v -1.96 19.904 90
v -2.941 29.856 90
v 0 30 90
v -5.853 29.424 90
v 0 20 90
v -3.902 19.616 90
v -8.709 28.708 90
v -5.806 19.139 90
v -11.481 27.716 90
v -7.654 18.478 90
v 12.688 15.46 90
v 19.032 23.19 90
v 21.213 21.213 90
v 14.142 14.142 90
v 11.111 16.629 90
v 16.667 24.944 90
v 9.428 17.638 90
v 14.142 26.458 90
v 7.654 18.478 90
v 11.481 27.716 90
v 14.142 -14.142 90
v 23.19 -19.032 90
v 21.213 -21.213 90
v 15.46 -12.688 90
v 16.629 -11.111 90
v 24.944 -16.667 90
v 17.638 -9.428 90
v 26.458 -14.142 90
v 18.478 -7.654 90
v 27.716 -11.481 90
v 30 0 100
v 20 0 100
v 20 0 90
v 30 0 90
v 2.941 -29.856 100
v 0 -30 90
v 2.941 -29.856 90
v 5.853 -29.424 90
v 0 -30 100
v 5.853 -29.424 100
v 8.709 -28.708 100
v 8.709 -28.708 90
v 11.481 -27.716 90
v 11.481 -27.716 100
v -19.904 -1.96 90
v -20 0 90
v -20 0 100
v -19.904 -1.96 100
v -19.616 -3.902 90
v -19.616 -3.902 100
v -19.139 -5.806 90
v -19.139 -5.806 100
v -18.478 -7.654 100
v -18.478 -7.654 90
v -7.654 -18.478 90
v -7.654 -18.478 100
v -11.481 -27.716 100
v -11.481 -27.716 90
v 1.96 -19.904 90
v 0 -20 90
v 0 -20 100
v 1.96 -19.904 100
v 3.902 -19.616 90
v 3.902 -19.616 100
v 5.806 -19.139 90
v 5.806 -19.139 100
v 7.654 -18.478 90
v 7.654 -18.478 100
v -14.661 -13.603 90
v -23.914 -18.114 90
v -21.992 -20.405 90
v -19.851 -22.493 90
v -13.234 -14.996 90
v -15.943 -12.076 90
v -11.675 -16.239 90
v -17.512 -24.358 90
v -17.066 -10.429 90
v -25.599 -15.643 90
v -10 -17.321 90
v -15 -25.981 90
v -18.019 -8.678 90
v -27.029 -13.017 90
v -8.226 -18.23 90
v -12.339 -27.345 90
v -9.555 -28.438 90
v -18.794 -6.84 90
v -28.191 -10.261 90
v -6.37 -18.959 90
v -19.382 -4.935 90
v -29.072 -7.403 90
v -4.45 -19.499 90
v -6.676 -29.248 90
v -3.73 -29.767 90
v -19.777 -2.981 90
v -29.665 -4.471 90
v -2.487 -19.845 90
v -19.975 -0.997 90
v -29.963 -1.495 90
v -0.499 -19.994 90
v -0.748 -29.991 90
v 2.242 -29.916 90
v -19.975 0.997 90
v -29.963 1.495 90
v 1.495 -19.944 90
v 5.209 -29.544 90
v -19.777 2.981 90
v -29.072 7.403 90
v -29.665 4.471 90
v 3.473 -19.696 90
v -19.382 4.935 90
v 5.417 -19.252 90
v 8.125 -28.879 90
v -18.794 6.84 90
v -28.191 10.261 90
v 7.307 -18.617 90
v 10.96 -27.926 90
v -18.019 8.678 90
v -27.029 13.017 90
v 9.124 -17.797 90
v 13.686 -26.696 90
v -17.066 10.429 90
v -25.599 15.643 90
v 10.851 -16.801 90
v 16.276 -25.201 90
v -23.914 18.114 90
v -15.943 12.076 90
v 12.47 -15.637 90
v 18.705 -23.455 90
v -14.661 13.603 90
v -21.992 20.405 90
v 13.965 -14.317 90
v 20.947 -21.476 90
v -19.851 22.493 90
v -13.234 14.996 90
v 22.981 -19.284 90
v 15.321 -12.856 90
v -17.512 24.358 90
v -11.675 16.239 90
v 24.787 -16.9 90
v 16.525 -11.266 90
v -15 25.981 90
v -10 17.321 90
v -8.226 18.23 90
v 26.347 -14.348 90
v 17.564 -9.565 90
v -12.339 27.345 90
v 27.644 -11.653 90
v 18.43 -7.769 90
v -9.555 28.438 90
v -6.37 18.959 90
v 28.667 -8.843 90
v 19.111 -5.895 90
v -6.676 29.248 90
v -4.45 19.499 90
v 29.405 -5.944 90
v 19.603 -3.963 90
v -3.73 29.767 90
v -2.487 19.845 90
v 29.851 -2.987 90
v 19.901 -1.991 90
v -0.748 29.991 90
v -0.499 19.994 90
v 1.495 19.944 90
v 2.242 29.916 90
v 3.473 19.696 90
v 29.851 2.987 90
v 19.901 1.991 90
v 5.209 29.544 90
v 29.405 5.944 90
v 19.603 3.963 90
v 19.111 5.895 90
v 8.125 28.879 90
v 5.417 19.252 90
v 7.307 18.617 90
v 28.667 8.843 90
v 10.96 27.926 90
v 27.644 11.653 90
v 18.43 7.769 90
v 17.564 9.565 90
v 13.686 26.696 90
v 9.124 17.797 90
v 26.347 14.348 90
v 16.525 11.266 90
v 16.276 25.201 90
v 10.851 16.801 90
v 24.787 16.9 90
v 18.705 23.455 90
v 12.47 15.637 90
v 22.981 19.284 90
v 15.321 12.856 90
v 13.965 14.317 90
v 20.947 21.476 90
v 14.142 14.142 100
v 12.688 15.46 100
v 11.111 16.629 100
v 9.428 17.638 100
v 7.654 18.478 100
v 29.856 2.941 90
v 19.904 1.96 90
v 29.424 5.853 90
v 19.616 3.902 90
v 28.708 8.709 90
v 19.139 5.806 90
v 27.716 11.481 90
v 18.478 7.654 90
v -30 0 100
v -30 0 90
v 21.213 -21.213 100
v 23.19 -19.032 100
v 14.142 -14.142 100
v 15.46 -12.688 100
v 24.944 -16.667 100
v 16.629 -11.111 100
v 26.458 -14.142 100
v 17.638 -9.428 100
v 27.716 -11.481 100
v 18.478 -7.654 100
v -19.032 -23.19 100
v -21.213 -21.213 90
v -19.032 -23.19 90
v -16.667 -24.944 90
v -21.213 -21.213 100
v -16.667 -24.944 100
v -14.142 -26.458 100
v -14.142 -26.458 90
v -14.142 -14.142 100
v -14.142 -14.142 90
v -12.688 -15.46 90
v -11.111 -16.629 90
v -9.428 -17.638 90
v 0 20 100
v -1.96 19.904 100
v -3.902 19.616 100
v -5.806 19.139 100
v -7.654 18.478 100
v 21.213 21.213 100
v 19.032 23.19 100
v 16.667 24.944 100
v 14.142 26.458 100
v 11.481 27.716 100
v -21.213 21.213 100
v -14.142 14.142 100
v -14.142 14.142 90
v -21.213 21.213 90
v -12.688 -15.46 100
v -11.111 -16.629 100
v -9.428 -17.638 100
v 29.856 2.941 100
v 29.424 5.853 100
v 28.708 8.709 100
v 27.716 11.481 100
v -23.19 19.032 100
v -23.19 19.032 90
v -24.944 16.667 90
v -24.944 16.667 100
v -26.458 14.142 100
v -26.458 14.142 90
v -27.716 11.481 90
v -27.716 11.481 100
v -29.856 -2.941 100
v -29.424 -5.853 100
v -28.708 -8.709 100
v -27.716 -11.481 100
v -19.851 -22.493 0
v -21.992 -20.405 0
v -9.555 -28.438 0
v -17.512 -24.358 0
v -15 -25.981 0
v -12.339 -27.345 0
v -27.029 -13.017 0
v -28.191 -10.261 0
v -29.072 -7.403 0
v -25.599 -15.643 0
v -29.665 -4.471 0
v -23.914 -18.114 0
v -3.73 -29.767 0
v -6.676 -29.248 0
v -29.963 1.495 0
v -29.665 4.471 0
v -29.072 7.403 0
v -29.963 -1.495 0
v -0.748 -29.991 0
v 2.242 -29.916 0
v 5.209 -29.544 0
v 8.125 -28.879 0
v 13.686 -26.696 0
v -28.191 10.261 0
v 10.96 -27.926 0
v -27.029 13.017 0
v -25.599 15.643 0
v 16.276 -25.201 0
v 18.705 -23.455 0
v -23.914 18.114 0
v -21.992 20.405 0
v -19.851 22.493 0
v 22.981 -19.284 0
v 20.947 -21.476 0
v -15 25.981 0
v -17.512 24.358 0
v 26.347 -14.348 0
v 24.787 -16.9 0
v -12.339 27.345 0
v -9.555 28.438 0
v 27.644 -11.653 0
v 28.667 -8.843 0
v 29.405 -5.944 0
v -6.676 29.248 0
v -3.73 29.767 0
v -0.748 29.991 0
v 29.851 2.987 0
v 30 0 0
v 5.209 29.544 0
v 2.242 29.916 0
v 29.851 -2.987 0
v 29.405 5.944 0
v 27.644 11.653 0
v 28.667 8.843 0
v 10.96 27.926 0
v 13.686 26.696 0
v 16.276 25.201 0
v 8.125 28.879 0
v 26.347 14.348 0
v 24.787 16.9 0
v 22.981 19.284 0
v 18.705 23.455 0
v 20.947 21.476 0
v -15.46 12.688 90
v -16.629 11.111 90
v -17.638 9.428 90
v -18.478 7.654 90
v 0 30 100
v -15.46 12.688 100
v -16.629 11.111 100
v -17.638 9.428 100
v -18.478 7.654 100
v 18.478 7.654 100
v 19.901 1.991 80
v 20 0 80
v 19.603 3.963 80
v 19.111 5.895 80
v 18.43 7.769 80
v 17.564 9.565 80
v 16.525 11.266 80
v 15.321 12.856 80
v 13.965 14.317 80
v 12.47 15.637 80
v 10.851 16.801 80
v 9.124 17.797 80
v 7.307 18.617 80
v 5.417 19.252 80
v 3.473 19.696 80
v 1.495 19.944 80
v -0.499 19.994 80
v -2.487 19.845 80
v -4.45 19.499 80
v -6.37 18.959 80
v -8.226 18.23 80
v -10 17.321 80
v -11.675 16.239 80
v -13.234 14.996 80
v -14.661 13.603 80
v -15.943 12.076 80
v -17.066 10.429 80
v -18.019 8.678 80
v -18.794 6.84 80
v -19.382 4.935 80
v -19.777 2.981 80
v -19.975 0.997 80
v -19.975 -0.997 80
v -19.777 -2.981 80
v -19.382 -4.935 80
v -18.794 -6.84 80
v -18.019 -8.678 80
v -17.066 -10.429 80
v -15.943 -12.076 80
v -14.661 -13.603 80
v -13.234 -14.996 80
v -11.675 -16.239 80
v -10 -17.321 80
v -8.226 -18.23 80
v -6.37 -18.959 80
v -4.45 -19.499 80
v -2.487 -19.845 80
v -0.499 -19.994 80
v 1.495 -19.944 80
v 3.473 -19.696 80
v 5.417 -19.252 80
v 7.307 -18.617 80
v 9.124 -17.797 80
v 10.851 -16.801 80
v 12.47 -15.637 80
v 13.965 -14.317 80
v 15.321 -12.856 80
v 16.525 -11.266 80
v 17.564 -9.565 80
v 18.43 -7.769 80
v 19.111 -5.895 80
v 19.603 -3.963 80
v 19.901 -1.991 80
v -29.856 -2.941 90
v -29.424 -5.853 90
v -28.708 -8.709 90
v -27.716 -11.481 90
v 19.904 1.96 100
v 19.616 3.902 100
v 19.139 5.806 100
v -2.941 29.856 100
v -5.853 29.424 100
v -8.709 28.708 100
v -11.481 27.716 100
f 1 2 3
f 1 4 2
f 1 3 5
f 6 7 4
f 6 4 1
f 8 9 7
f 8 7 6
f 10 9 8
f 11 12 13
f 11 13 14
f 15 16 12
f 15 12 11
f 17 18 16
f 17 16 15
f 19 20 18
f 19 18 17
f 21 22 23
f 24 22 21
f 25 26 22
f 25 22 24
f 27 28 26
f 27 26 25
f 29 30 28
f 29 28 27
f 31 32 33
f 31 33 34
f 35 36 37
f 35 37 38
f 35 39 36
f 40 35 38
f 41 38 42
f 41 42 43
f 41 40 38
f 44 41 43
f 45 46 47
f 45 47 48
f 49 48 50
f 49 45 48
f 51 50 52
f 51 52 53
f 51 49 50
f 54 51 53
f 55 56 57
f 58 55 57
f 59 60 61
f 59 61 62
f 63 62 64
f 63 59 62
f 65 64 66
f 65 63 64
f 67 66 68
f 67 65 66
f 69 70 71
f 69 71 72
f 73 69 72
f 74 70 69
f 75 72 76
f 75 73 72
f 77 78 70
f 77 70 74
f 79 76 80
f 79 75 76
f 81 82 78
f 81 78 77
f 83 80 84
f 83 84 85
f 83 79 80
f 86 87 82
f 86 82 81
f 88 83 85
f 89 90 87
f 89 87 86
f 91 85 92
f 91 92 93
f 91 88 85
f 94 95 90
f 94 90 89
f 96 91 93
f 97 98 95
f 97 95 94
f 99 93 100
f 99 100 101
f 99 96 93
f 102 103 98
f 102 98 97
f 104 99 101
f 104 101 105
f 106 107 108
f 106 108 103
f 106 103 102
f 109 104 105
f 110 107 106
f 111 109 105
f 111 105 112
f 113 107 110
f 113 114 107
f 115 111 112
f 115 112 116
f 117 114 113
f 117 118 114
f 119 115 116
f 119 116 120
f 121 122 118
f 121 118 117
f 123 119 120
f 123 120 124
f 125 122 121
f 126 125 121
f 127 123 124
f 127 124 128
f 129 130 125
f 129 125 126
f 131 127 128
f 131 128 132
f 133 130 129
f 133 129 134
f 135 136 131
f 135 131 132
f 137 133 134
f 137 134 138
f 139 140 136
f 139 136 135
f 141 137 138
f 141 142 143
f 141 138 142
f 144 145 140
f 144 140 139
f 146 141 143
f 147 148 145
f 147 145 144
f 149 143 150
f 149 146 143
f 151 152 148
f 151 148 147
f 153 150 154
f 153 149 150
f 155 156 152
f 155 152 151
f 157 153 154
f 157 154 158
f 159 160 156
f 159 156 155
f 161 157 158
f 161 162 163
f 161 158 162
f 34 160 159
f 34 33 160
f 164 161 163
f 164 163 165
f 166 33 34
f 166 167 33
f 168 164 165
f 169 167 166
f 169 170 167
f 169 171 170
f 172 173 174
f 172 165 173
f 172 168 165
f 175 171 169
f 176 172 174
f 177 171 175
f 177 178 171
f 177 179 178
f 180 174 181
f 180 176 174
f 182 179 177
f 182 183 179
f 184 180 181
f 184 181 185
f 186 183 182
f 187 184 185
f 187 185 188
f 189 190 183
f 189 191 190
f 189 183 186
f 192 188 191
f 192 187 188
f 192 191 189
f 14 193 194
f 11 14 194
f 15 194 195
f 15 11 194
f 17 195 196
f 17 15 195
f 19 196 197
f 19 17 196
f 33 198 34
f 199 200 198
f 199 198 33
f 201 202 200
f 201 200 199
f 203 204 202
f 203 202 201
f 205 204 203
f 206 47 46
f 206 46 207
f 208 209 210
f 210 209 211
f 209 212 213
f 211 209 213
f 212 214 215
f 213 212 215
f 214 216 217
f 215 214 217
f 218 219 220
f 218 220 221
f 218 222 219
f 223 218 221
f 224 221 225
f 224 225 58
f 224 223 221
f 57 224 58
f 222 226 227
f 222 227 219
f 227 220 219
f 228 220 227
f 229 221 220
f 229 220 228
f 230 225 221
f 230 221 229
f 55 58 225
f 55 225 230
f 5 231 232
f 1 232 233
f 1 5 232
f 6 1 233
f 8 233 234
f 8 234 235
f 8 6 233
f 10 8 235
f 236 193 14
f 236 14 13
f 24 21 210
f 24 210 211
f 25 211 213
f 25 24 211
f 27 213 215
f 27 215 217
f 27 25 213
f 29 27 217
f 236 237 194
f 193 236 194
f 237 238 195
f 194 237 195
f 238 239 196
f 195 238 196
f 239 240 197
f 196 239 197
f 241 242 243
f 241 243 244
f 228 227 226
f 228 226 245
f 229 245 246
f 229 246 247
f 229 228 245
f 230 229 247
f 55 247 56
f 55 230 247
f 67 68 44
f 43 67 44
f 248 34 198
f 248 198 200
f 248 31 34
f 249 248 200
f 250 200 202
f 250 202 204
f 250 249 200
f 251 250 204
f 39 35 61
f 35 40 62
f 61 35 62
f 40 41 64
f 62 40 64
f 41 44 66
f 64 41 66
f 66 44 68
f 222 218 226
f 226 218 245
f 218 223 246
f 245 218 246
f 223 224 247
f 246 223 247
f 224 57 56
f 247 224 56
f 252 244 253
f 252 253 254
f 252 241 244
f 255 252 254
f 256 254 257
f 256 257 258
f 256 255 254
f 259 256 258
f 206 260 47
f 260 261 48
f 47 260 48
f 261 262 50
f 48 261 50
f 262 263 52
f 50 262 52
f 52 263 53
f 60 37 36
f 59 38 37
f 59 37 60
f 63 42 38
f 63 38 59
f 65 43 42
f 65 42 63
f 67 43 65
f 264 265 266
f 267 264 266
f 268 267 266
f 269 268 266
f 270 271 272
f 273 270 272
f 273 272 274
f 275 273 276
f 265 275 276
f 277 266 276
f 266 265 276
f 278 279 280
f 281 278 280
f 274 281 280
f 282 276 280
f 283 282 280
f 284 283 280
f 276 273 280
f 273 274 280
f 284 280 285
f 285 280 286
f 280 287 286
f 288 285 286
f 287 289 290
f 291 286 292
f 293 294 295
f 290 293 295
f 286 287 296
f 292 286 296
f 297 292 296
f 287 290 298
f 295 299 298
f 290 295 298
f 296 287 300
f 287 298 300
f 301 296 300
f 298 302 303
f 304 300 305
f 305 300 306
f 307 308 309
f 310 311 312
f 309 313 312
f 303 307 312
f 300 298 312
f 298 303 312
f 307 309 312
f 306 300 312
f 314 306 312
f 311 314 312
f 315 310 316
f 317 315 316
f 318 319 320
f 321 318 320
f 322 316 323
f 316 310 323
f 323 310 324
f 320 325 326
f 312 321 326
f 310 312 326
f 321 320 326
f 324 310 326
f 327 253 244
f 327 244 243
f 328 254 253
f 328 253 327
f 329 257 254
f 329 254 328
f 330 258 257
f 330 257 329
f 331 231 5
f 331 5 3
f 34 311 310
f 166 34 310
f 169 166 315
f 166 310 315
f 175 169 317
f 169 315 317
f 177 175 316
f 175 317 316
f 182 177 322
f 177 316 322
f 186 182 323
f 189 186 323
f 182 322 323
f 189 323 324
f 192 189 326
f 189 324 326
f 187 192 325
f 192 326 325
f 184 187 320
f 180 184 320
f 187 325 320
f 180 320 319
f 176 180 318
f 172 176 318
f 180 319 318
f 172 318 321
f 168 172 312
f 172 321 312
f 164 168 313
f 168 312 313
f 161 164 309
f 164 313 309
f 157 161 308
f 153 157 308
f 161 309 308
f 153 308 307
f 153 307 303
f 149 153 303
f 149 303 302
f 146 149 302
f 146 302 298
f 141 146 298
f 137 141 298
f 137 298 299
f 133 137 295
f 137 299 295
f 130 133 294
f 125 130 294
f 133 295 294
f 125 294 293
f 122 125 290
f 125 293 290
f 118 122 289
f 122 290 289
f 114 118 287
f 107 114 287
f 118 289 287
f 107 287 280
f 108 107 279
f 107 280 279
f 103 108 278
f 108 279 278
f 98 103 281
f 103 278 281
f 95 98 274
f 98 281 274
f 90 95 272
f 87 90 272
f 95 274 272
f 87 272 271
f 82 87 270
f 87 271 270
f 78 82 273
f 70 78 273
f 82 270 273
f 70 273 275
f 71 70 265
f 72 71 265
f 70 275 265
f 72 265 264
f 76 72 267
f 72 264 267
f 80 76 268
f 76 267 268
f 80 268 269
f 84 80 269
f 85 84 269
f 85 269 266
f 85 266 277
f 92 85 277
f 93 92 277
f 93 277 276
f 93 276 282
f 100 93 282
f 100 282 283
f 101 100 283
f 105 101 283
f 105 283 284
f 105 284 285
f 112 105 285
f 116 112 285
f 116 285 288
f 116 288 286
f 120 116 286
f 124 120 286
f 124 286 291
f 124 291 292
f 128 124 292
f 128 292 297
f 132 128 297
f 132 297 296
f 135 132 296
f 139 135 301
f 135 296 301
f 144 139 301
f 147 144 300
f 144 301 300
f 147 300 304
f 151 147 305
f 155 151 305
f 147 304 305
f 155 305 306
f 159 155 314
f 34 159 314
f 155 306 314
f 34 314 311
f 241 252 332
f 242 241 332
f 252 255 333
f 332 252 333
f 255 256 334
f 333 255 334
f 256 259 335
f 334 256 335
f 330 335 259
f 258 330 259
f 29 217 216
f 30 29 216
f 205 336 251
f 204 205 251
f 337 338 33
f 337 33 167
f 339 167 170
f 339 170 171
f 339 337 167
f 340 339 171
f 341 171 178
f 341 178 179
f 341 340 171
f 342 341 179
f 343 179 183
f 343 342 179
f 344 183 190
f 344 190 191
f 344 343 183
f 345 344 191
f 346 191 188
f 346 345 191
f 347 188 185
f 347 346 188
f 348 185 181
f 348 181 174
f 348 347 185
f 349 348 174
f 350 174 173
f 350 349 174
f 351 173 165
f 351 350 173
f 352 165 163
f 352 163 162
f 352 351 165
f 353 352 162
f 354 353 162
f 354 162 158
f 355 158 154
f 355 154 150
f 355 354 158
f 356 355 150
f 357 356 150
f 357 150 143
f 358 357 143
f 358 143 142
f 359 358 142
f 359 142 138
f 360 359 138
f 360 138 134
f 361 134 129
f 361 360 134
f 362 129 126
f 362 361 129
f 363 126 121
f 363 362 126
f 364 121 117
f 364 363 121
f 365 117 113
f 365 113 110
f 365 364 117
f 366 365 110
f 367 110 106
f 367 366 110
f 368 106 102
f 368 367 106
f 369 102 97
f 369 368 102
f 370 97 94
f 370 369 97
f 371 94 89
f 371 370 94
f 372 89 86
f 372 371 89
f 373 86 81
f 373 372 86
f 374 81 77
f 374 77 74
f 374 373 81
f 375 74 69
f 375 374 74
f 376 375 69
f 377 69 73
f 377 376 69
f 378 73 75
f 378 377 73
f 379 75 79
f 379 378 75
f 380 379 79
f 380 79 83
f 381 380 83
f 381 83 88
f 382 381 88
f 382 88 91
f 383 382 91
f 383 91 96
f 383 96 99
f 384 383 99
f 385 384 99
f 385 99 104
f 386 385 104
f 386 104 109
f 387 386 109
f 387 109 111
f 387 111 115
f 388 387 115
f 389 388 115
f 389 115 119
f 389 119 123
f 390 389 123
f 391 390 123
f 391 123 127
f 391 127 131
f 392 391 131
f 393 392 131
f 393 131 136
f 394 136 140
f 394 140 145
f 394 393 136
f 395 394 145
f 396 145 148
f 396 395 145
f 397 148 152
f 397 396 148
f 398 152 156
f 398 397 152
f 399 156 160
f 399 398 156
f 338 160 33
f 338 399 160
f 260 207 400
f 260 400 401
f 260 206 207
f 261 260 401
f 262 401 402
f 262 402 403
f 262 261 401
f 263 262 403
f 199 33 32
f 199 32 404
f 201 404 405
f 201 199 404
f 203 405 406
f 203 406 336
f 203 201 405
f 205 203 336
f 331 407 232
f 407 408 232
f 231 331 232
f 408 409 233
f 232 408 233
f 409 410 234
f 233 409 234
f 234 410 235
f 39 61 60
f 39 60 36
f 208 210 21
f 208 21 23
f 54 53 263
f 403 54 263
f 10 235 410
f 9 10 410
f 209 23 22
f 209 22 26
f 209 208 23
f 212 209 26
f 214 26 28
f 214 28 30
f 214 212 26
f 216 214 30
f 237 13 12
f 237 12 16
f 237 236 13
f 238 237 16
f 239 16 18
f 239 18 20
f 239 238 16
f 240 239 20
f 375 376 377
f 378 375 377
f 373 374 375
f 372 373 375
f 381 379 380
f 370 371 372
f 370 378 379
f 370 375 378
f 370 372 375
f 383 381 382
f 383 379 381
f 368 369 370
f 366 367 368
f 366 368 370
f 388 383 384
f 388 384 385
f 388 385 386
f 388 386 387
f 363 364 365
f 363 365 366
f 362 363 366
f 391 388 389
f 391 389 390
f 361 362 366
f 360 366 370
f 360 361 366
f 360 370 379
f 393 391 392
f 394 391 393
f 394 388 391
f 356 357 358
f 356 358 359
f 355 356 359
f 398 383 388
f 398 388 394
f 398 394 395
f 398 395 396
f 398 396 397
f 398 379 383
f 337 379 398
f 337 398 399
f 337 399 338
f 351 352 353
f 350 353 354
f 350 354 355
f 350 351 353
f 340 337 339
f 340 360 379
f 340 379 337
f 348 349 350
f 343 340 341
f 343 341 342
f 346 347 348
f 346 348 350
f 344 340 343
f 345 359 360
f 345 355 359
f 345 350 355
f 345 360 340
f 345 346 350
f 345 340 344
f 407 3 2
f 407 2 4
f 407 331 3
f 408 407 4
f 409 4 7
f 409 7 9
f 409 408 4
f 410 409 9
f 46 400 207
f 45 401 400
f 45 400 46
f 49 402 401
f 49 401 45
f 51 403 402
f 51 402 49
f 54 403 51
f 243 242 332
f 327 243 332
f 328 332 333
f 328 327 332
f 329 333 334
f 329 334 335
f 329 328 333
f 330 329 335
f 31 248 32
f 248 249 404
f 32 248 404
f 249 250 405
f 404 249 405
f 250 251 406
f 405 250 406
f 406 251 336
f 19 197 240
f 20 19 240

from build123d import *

# Parameters (mm, degrees)
CYLINDER001_R               = 20
CYLINDER001_DEPTH           = 10
CYLINDER_R                  = 30
CYLINDER_DEPTH              = 90
CYLINDER010_R               = 20
CYLINDER010_DEPTH           = 10
CYLINDER009_W               = 30
CYLINDER009_H               = 10
CYLINDER009_ANGLE           = 22.5
CYLINDER009_PLACEMENT_ANGLE = 315
CYLINDER008_W               = 30
CYLINDER008_H               = 10
CYLINDER008_ANGLE           = 22.5
CYLINDER007_W               = 30
CYLINDER007_H               = 10
CYLINDER007_ANGLE           = 22.5
CYLINDER007_PLACEMENT_ANGLE = 225
CYLINDER006_W               = 30
CYLINDER006_H               = 10
CYLINDER006_ANGLE           = 22.5
CYLINDER005_W               = 30
CYLINDER005_H               = 10
CYLINDER005_ANGLE           = 22.5
CYLINDER005_PLACEMENT_ANGLE = 135
CYLINDER004_W               = 30
CYLINDER004_H               = 10
CYLINDER004_ANGLE           = 22.5
CYLINDER003_W               = 30
CYLINDER003_H               = 10
CYLINDER003_ANGLE           = 22.5
CYLINDER003_PLACEMENT_ANGLE = 45
CYLINDER002_W               = 30
CYLINDER002_H               = 10
CYLINDER002_ANGLE           = 22.5


with BuildPart() as cylinder001:
    # Cylinder001 → Cylinder001 (new body)
    with BuildSketch(Plane.XY.offset(80)):
        Circle(CYLINDER001_R)
    extrude(amount=CYLINDER001_DEPTH)


with BuildPart() as cut:
    # Cylinder → Cylinder (new body)
    with BuildSketch(Plane.XY):
        Circle(CYLINDER_R)
    extrude(amount=CYLINDER_DEPTH)

    # Cut: cut Cylinder001
    add(cylinder001.part, mode=Mode.SUBTRACT)


with BuildPart() as cylinder010:
    # Cylinder010 → Cylinder010 (new body)
    with BuildSketch(Plane.XY.offset(90)):
        Circle(CYLINDER010_R)
    extrude(amount=CYLINDER010_DEPTH)


with BuildPart() as cut001:
    # Cylinder009 → Cylinder009 (revolve)
    with BuildSketch(Plane.XZ):
        with Locations((15, 5)):
            Rectangle(CYLINDER009_W, CYLINDER009_H)
    revolve(axis=Axis((0, 0, 0), (0, 0, 1)), revolution_arc=CYLINDER009_ANGLE)


with BuildPart() as cut001_1:
    # Cylinder009 placement: moved
    add(cut001.part.moved(Location((0, 0, 90))).rotate(Axis((0, 0, 90), (0, 0, 1)), CYLINDER009_PLACEMENT_ANGLE))

    # Cut001: cut Cylinder010
    add(cylinder010.part, mode=Mode.SUBTRACT)


with BuildPart() as cut002:
    # Cylinder008 → Cylinder008 (revolve)
    with BuildSketch(Plane(origin=(0, 0, 90), x_dir=(0, -1, 0), z_dir=(-1, 0, 0))):
        with Locations((15, 5)):
            Rectangle(CYLINDER008_W, CYLINDER008_H)
    revolve(axis=Axis((0, 0, 90), (0, 0, 1)), revolution_arc=CYLINDER008_ANGLE)

    # Cut002: cut Cylinder010
    add(cylinder010.part, mode=Mode.SUBTRACT)


with BuildPart() as cut003:
    # Cylinder007 → Cylinder007 (revolve)
    with BuildSketch(Plane.XZ):
        with Locations((15, 5)):
            Rectangle(CYLINDER007_W, CYLINDER007_H)
    revolve(axis=Axis((0, 0, 0), (0, 0, 1)), revolution_arc=CYLINDER007_ANGLE)


with BuildPart() as cut003_1:
    # Cylinder007 placement: moved
    add(cut003.part.moved(Location((0, 0, 90))).rotate(Axis((0, 0, 90), (0, 0, 1)), CYLINDER007_PLACEMENT_ANGLE))

    # Cut003: cut Cylinder010
    add(cylinder010.part, mode=Mode.SUBTRACT)


with BuildPart() as cut004:
    # Cylinder006 → Cylinder006 (revolve)
    with BuildSketch(Plane(origin=(0, 0, 90), x_dir=(-1, 0, 0), z_dir=(0, 1, 0))):
        with Locations((15, 5)):
            Rectangle(CYLINDER006_W, CYLINDER006_H)
    revolve(axis=Axis((0, 0, 90), (0, 0, 1)), revolution_arc=CYLINDER006_ANGLE)

    # Cut004: cut Cylinder010
    add(cylinder010.part, mode=Mode.SUBTRACT)


with BuildPart() as cut005:
    # Cylinder005 → Cylinder005 (revolve)
    with BuildSketch(Plane.XZ):
        with Locations((15, 5)):
            Rectangle(CYLINDER005_W, CYLINDER005_H)
    revolve(axis=Axis((0, 0, 0), (0, 0, 1)), revolution_arc=CYLINDER005_ANGLE)


with BuildPart() as cut005_1:
    # Cylinder005 placement: moved
    add(cut005.part.moved(Location((0, 0, 90))).rotate(Axis((0, 0, 90), (0, 0, 1)), CYLINDER005_PLACEMENT_ANGLE))

    # Cut005: cut Cylinder010
    add(cylinder010.part, mode=Mode.SUBTRACT)


with BuildPart() as cut006:
    # Cylinder004 → Cylinder004 (revolve)
    with BuildSketch(Plane(origin=(0, 0, 90), x_dir=(0, 1, 0), z_dir=(1, 0, 0))):
        with Locations((15, 5)):
            Rectangle(CYLINDER004_W, CYLINDER004_H)
    revolve(axis=Axis((0, 0, 90), (0, 0, 1)), revolution_arc=CYLINDER004_ANGLE)

    # Cut006: cut Cylinder010
    add(cylinder010.part, mode=Mode.SUBTRACT)


with BuildPart() as cut007:
    # Cylinder003 → Cylinder003 (revolve)
    with BuildSketch(Plane.XZ):
        with Locations((15, 5)):
            Rectangle(CYLINDER003_W, CYLINDER003_H)
    revolve(axis=Axis((0, 0, 0), (0, 0, 1)), revolution_arc=CYLINDER003_ANGLE)


with BuildPart() as cut007_1:
    # Cylinder003 placement: moved
    add(cut007.part.moved(Location((0, 0, 90))).rotate(Axis((0, 0, 90), (0, 0, 1)), CYLINDER003_PLACEMENT_ANGLE))

    # Cut007: cut Cylinder010
    add(cylinder010.part, mode=Mode.SUBTRACT)


with BuildPart() as cut008:
    # Cylinder002 → Cylinder002 (revolve)
    with BuildSketch(Plane(origin=(0, 0, 90), x_dir=(1, 0, 0), z_dir=(0, -1, 0))):
        with Locations((15, 5)):
            Rectangle(CYLINDER002_W, CYLINDER002_H)
    revolve(axis=Axis((0, 0, 90), (0, 0, 1)), revolution_arc=CYLINDER002_ANGLE)

    # Cut008: cut Cylinder010
    add(cylinder010.part, mode=Mode.SUBTRACT)


solid = Compound([cut.part, cut001_1.part, cut002.part, cut003_1.part, cut004.part, cut005_1.part, cut006.part, cut007_1.part, cut008.part])
